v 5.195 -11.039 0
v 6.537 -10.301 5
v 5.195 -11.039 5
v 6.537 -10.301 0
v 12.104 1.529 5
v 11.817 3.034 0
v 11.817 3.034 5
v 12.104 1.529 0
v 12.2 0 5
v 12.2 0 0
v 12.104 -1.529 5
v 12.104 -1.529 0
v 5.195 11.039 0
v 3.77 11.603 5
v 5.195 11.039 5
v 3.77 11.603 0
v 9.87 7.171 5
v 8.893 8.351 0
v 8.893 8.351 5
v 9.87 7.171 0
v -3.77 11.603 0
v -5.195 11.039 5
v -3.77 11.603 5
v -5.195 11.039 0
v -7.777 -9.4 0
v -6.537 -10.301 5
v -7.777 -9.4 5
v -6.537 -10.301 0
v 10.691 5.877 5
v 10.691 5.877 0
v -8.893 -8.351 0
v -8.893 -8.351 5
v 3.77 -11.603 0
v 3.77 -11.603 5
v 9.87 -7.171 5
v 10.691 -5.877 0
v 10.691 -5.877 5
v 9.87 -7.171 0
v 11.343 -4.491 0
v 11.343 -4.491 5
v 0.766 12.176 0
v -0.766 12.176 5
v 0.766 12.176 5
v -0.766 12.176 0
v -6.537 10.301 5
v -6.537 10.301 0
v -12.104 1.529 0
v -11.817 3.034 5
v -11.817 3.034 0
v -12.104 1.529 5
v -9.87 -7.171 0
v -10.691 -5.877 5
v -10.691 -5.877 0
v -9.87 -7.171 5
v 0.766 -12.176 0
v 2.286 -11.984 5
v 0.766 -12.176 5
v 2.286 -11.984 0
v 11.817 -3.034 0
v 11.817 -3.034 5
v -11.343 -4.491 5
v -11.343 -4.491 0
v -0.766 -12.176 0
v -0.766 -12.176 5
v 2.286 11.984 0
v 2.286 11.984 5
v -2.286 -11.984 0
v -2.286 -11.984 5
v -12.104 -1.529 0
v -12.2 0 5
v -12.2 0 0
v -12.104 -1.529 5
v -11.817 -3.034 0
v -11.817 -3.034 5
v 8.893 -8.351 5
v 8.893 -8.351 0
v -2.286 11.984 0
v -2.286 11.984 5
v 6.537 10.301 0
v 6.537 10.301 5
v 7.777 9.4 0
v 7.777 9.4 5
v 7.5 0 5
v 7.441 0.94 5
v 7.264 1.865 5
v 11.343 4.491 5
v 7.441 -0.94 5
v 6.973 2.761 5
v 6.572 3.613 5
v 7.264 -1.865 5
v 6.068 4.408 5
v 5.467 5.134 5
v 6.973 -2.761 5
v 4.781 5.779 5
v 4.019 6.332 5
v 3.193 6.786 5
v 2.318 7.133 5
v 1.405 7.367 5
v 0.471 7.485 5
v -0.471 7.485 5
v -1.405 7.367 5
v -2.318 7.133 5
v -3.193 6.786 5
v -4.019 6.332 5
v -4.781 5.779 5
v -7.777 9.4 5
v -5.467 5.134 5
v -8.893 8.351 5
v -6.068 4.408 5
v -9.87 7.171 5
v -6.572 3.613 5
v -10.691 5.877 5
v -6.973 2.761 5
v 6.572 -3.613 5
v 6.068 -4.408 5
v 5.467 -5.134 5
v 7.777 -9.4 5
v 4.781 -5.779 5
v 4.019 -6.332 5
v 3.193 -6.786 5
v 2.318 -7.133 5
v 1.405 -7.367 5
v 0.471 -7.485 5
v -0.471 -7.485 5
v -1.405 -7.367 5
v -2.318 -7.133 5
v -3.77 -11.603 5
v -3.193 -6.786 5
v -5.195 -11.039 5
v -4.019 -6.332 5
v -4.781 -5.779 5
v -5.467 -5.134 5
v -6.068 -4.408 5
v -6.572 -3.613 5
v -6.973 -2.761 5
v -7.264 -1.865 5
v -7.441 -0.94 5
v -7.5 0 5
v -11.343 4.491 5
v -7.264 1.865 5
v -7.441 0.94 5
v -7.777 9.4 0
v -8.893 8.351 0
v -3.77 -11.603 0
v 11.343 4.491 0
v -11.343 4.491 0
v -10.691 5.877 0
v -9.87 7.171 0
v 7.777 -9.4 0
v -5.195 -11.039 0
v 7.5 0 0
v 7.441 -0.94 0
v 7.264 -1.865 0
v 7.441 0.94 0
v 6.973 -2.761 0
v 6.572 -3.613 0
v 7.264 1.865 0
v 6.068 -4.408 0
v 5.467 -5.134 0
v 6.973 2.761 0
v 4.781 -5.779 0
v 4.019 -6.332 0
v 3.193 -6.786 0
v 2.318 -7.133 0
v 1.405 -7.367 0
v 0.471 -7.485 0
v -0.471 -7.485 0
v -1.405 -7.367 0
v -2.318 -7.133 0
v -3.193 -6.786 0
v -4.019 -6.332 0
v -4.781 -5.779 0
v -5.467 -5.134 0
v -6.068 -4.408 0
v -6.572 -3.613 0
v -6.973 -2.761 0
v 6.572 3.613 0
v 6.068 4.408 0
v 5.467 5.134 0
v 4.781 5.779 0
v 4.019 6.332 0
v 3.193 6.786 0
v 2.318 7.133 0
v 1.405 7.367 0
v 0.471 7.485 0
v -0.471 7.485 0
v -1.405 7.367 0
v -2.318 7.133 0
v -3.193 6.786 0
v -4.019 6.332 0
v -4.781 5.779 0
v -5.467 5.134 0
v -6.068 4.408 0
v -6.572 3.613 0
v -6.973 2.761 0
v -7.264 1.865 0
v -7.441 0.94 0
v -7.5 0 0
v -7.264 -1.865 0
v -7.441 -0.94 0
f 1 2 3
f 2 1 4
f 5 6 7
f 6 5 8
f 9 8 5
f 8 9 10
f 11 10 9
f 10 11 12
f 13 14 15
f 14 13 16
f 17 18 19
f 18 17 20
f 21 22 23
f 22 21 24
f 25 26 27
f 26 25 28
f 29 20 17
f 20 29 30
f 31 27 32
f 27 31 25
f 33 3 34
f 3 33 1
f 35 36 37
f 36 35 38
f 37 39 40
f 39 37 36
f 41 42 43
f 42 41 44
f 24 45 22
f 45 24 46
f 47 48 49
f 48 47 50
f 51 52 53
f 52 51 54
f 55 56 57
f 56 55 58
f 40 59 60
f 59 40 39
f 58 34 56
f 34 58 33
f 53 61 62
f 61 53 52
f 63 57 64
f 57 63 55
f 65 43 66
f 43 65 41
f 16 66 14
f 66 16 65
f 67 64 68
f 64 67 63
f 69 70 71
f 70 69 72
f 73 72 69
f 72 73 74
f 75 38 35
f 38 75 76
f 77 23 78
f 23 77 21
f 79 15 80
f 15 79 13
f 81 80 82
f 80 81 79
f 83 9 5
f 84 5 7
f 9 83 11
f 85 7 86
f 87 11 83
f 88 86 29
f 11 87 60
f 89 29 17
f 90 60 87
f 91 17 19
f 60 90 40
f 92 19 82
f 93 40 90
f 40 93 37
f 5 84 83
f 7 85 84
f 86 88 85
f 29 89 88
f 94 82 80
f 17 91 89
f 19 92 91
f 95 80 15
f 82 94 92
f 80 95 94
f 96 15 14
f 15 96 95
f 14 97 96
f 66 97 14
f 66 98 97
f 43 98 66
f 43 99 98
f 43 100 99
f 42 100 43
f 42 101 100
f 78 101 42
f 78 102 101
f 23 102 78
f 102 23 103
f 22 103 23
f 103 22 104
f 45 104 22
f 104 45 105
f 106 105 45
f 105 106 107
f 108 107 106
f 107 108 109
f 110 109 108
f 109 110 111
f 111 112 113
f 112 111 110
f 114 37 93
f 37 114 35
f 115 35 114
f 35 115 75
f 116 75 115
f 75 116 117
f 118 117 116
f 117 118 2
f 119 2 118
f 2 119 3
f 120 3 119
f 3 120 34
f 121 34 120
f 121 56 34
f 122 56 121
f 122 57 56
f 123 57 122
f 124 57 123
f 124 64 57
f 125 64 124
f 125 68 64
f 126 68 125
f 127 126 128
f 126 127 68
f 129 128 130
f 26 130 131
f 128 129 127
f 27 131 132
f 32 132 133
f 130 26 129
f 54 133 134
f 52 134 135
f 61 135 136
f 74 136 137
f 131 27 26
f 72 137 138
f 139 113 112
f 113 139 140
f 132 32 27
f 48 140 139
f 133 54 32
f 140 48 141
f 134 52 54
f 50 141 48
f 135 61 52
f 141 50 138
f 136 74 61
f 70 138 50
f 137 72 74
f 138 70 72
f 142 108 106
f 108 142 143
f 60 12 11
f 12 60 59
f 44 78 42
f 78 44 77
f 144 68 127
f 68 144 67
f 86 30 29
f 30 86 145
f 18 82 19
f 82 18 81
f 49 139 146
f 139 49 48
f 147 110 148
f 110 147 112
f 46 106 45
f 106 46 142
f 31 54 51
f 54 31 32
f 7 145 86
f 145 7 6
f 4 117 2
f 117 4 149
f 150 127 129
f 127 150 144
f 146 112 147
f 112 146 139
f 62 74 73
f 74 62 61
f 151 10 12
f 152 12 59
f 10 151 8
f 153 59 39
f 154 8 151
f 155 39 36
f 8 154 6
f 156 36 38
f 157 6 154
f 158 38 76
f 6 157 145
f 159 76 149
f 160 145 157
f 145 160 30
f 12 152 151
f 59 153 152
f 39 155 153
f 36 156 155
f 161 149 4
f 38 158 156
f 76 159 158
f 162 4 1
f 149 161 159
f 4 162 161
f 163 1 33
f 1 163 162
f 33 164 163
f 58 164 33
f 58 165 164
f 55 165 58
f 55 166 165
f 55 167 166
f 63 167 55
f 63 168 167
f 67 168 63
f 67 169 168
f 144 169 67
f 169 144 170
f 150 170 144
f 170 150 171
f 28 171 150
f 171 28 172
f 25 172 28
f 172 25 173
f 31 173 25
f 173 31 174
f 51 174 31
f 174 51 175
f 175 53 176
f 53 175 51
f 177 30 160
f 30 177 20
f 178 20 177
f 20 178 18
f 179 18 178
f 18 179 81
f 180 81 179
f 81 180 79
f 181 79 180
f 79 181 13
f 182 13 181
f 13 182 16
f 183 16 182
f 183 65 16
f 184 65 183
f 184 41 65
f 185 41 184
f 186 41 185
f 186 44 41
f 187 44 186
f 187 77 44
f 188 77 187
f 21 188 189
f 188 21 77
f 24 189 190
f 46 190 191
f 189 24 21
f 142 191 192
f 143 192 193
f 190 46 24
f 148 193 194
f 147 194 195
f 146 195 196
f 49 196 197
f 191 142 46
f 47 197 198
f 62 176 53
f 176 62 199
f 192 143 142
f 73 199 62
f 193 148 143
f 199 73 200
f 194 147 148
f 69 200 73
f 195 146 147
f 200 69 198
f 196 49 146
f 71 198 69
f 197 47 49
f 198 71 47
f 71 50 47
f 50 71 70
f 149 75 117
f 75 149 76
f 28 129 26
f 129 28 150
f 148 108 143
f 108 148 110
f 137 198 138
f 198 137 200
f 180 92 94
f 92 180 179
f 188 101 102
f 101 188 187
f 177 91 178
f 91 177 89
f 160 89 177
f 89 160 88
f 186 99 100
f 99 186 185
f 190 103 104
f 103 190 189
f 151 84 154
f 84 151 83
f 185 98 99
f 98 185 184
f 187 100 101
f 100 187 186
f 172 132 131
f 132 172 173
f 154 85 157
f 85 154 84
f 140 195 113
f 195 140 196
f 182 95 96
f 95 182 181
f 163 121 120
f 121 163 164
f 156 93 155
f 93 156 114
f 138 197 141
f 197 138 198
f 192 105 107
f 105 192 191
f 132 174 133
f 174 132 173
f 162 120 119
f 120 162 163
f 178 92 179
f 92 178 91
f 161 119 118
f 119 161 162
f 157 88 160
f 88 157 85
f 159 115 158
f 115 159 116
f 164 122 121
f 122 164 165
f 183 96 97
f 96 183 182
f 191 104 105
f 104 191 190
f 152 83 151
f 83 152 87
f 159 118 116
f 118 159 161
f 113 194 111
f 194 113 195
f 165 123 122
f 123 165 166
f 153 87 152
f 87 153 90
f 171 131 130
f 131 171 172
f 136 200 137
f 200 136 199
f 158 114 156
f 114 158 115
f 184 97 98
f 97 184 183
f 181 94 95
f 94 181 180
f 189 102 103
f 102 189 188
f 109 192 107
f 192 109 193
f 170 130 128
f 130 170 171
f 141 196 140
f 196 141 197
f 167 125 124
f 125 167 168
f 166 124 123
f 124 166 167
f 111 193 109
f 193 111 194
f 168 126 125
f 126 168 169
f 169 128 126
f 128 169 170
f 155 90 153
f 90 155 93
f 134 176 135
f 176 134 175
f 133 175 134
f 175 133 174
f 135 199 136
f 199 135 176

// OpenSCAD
$fn = 50;


difference() {
	union() {
		cylinder(h = 5, r = 12.2000000000);
	}
	union() {
		cylinder(h = 5, r = 7.5000000000);
	}
}
